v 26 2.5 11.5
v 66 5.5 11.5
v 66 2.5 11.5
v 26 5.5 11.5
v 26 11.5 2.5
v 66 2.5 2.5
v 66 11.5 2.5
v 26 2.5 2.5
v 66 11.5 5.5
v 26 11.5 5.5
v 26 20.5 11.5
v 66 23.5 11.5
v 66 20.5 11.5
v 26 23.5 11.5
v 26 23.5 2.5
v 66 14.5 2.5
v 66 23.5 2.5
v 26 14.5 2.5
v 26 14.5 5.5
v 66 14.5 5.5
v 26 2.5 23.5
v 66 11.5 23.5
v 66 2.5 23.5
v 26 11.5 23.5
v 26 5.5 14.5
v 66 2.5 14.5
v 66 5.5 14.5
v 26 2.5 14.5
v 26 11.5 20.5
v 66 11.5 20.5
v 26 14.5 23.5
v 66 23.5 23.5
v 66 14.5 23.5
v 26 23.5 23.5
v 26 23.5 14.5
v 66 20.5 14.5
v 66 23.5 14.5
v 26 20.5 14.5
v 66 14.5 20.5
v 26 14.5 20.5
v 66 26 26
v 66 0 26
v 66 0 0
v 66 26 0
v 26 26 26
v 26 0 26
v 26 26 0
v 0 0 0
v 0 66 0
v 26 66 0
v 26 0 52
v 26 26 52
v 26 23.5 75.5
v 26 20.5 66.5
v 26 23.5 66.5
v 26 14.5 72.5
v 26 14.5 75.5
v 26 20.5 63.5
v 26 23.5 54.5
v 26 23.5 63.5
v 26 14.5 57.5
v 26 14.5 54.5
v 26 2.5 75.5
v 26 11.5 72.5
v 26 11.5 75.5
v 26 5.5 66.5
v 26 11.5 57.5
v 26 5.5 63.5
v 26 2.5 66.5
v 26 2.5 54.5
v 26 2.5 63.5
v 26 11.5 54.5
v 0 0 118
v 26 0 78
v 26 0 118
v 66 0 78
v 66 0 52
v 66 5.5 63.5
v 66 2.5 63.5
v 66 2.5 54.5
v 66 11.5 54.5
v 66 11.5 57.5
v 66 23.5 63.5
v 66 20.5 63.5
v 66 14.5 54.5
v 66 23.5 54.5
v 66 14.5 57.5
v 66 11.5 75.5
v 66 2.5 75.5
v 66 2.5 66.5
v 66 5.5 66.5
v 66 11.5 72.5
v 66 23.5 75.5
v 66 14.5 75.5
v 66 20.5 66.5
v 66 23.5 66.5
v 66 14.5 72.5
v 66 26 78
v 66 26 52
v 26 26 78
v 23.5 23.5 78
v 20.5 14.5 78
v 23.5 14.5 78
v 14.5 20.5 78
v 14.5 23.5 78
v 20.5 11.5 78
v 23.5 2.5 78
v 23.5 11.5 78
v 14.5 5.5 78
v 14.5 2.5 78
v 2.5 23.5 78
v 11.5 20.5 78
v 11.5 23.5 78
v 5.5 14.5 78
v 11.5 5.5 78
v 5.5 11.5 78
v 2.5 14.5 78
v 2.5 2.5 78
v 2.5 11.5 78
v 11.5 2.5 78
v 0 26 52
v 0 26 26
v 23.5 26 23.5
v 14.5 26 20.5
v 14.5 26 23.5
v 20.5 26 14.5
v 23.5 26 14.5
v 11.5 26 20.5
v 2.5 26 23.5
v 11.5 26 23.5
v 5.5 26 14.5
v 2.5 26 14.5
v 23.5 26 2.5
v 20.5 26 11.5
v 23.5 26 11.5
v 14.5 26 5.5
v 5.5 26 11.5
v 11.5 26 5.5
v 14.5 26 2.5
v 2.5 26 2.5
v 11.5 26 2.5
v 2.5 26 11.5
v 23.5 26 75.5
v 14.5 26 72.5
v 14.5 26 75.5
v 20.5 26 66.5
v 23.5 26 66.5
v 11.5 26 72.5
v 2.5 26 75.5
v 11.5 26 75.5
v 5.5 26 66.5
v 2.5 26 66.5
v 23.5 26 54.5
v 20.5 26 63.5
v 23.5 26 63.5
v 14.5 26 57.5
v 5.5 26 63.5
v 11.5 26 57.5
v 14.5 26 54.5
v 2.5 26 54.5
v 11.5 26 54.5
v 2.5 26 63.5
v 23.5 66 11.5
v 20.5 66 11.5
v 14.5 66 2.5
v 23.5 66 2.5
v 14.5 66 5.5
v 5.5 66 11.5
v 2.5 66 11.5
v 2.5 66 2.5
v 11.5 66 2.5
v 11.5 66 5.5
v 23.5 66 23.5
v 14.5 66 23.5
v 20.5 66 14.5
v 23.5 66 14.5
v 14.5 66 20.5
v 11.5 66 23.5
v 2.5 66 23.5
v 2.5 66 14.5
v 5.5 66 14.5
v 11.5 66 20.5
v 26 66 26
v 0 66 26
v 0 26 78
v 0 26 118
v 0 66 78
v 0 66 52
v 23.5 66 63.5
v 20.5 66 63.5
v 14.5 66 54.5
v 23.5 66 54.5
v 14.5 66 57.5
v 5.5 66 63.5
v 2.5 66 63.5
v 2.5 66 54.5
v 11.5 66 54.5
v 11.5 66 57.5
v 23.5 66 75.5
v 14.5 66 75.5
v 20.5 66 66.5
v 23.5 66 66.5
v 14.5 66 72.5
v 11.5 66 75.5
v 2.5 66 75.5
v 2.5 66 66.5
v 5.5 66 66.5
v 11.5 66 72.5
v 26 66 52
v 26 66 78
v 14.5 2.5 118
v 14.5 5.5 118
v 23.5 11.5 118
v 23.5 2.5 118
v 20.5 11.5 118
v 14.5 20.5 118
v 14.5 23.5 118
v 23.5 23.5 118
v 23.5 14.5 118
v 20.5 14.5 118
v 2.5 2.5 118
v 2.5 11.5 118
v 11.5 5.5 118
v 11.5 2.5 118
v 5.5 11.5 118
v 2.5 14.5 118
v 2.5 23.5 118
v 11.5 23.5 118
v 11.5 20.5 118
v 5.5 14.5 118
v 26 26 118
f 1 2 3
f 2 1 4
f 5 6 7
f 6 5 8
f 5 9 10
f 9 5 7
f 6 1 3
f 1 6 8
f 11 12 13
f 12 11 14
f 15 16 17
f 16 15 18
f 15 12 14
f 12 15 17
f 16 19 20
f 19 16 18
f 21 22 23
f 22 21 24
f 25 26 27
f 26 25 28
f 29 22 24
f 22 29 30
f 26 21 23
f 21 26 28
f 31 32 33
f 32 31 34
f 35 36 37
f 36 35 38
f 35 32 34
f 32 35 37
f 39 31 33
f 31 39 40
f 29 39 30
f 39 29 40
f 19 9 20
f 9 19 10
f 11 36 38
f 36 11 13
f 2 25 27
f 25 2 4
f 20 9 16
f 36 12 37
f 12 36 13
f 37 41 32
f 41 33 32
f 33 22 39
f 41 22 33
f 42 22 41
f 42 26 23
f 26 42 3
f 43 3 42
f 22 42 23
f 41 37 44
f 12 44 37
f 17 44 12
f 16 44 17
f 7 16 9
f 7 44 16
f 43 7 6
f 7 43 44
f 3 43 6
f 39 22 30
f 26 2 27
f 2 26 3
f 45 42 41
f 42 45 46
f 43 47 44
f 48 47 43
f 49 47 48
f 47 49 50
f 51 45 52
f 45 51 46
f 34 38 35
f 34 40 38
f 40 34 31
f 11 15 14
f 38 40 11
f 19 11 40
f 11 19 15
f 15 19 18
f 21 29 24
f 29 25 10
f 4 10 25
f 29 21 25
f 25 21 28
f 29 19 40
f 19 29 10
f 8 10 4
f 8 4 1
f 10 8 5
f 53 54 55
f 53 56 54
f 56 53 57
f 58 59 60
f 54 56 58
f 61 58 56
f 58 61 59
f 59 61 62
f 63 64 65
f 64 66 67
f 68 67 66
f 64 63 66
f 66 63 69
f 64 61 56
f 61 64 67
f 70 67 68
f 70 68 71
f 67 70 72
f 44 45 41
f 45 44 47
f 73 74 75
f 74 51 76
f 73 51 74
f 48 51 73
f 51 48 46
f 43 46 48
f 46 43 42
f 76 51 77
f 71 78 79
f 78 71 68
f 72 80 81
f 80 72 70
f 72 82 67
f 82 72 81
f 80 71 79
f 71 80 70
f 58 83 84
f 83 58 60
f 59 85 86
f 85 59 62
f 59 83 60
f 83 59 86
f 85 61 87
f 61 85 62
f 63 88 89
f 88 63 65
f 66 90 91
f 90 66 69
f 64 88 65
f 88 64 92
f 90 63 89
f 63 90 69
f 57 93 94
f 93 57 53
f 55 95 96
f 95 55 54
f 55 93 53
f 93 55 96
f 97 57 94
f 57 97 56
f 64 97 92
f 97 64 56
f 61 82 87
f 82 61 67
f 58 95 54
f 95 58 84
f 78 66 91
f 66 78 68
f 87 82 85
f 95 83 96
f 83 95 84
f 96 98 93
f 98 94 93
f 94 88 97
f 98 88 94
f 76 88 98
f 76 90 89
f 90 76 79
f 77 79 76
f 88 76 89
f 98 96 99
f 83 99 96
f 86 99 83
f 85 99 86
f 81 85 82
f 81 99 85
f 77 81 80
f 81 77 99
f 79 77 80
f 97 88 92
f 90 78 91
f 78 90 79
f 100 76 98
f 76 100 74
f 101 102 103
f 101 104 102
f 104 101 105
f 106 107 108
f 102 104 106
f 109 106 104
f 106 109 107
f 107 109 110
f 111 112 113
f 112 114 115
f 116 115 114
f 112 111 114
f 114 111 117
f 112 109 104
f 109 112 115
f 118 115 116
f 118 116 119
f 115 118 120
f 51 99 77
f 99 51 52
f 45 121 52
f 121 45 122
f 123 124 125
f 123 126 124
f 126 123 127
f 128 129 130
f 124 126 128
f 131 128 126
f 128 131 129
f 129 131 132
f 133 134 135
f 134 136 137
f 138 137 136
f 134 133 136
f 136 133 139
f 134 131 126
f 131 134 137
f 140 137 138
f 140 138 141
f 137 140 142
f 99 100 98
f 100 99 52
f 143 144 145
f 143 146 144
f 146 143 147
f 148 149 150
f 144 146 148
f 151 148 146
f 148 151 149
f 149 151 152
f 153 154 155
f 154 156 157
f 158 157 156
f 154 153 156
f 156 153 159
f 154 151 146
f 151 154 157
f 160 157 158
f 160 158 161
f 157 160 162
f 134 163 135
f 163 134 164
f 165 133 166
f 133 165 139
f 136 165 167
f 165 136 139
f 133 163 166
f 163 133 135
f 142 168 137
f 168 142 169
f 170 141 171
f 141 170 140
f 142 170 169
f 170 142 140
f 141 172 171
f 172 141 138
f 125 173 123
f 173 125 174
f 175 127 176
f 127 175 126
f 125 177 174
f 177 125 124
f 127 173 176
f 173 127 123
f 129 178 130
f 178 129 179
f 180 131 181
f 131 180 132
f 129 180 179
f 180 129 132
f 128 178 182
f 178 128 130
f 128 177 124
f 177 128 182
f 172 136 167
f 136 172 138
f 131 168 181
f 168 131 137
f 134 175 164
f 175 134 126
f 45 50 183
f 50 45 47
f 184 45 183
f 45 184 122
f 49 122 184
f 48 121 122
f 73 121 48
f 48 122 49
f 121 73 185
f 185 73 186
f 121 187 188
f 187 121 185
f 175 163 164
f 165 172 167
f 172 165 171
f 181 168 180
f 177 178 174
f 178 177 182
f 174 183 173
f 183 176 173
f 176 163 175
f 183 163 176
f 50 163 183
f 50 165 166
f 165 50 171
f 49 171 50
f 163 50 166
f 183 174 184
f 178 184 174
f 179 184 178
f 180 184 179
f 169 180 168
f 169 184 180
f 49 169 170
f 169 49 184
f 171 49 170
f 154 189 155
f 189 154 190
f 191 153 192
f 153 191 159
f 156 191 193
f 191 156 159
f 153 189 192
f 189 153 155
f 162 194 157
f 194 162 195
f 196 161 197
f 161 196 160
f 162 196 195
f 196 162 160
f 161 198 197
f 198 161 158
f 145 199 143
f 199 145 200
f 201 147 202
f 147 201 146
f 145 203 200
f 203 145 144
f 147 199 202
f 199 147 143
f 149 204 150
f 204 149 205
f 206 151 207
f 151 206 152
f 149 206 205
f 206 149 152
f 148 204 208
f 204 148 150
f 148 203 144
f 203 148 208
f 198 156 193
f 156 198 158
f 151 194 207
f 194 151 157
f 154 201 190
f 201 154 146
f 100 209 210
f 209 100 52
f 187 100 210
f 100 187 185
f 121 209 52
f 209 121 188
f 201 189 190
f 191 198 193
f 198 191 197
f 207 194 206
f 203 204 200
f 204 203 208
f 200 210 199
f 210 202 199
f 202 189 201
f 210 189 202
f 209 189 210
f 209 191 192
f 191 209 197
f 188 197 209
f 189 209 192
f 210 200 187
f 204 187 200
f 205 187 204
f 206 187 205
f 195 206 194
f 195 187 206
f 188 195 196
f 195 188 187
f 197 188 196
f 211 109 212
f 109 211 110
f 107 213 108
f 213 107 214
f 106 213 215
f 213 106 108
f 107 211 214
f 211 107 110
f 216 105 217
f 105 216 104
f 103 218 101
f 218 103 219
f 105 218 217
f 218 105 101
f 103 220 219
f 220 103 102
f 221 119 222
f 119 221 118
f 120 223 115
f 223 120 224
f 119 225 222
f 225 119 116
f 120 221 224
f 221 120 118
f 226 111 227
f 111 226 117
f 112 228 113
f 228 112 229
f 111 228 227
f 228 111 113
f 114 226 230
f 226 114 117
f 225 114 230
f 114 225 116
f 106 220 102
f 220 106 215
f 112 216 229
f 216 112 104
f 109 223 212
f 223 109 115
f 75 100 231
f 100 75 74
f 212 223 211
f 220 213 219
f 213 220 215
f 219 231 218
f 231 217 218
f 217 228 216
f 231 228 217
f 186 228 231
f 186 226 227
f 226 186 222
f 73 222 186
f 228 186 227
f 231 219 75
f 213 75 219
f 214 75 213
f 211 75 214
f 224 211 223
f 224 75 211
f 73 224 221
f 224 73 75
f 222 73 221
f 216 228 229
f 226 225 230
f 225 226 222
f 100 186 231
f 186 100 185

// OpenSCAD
// file: modules_coin_0_3.scad
module tube_profile(longueur, epaisseur_bloc = 3, largeur_bloc = 6, largeur_profile = 20)
{
    ecart = (largeur_profile - largeur_bloc)/2;

    translate([-1,0,0])
    #cube([longueur+2,ecart,ecart]);
    
    translate([-1,ecart+largeur_bloc,0])
    #cube([longueur+2,ecart,ecart]);
    
    translate([-1,0,ecart+largeur_bloc])
    #cube([longueur+2,ecart,ecart]);
    
    translate([-1,ecart+largeur_bloc,ecart+largeur_bloc])
    #cube([longueur+2,ecart,ecart]);
    
    translate([-1,epaisseur_bloc,epaisseur_bloc])
    #cube([longueur+2,largeur_profile-2*epaisseur_bloc,largeur_profile-2*epaisseur_bloc]);
}
// main file
include <modules_coin_0_3.scad>

longueur_tube = 40;
largeur_tube = 26;
largeur_profile = 21;

epaisseur_bloc = 3;
longueur_bloc = 6;

epaisseur_tube = (largeur_tube-largeur_profile)/2;

union()
{
    color("green")
    cube([largeur_tube, largeur_tube, largeur_tube*3]);

    difference ()
    {
        color("blue")
        translate([largeur_tube,0,0])
        cube([longueur_tube,largeur_tube,largeur_tube]);

        color("red")
        translate([largeur_tube,epaisseur_tube,epaisseur_tube])
        tube_profile(longueur_tube+1, epaisseur_bloc, epaisseur_bloc, largeur_profile);
    }

    difference ()
    {
        color("blue")
        translate([largeur_tube,0,largeur_tube*2])
        cube([longueur_tube,largeur_tube,largeur_tube]);
        
        color("red")
        translate([largeur_tube,epaisseur_tube,epaisseur_tube+largeur_tube*2])
        tube_profile(longueur_tube+1, epaisseur_bloc, epaisseur_bloc, largeur_profile);
    }

    difference ()
    {
        color("blue")
        translate([0,largeur_tube,0])
        cube([largeur_tube,longueur_tube,largeur_tube]);
        
        color("red")
        translate([largeur_tube-epaisseur_tube,largeur_tube,epaisseur_tube])
        rotate([0,0,90])
        tube_profile(longueur_tube+1, epaisseur_bloc, epaisseur_bloc, largeur_profile);
    }

    difference ()
    {
        color("blue")
        translate([0,largeur_tube,largeur_tube*2])
        cube([largeur_tube,longueur_tube,largeur_tube]);

        color("red")
        translate([largeur_tube-epaisseur_tube,largeur_tube,epaisseur_tube+largeur_tube*2])
        rotate([0,0,90])
        tube_profile(longueur_tube+1, epaisseur_bloc, epaisseur_bloc, largeur_profile);
    }

    difference ()
    {
        color("blue")
        translate([0,0,largeur_tube*3])
        cube([largeur_tube,largeur_tube,longueur_tube]);

        // tube_profile(3,3,78,41);
        color("red")
        translate([largeur_tube-epaisseur_tube,epaisseur_tube,largeur_tube*3])
        rotate([0,-90,0])
        tube_profile(longueur_tube+1, epaisseur_bloc, epaisseur_bloc, largeur_profile);
    }

    /*translate([26,0,78])
    color([0,0,1])
    polyhedron(
        // [        [0+26,0,0+78],[40+26,0,0+78],[0+26,0,40+78],
        //          [0+26,3,0+78],[40+26,3,0+78],[0+26,3,40+78]]

        points=[    [40,0,0],[40,3,0],[0,3,0],
                    [0,0,0],[0,0,40],[0,3,40]],
    
        faces=[[0,1,2,3],[5,4,3,2],[0,4,5,1],[0,3,4],[5,2,1]]
    );
    
    translate([26,23,78])
    color([0,0,1])
    polyhedron(
        // [        [0+26,0,0+78],[40+26,0,0+78],[0+26,0,40+78],
        //          [0+26,3,0+78],[40+26,3,0+78],[0+26,3,40+78]]

        points=[    [40,0,0],[40,3,0],[0,3,0],
                    [0,0,0],[0,0,40],[0,3,40]],
    
        faces=[[0,1,2,3],[5,4,3,2],[0,4,5,1],[0,3,4],[5,2,1]]
    );
    
    translate([3,26,78])
    rotate([0,0,90])
    color("orange")
    polyhedron(
        // [        [0+26,0,0+78],[40+26,0,0+78],[0+26,0,40+78],
        //          [0+26,3,0+78],[40+26,3,0+78],[0+26,3,40+78]]

        points=[    [40,0,0],[40,3,0],[0,3,0],
                    [0,0,0],[0,0,40],[0,3,40]],
    
        faces=[[0,1,2,3],[5,4,3,2],[0,4,5,1],[0,3,4],[5,2,1]]
    );
    
    translate([26,26,78])
    rotate([0,0,90])
    color("black")
    polyhedron(
        // [        [0+26,0,0+78],[40+26,0,0+78],[0+26,0,40+78],
        //          [0+26,3,0+78],[40+26,3,0+78],[0+26,3,40+78]]

        points=[    [40,0,0],[40,3,0],[0,3,0],
                    [0,0,0],[0,0,40],[0,3,40]],
    
        faces=[[0,1,2,3],[5,4,3,2],[0,4,5,1],[0,3,4],[5,2,1]]
    );*/
}
